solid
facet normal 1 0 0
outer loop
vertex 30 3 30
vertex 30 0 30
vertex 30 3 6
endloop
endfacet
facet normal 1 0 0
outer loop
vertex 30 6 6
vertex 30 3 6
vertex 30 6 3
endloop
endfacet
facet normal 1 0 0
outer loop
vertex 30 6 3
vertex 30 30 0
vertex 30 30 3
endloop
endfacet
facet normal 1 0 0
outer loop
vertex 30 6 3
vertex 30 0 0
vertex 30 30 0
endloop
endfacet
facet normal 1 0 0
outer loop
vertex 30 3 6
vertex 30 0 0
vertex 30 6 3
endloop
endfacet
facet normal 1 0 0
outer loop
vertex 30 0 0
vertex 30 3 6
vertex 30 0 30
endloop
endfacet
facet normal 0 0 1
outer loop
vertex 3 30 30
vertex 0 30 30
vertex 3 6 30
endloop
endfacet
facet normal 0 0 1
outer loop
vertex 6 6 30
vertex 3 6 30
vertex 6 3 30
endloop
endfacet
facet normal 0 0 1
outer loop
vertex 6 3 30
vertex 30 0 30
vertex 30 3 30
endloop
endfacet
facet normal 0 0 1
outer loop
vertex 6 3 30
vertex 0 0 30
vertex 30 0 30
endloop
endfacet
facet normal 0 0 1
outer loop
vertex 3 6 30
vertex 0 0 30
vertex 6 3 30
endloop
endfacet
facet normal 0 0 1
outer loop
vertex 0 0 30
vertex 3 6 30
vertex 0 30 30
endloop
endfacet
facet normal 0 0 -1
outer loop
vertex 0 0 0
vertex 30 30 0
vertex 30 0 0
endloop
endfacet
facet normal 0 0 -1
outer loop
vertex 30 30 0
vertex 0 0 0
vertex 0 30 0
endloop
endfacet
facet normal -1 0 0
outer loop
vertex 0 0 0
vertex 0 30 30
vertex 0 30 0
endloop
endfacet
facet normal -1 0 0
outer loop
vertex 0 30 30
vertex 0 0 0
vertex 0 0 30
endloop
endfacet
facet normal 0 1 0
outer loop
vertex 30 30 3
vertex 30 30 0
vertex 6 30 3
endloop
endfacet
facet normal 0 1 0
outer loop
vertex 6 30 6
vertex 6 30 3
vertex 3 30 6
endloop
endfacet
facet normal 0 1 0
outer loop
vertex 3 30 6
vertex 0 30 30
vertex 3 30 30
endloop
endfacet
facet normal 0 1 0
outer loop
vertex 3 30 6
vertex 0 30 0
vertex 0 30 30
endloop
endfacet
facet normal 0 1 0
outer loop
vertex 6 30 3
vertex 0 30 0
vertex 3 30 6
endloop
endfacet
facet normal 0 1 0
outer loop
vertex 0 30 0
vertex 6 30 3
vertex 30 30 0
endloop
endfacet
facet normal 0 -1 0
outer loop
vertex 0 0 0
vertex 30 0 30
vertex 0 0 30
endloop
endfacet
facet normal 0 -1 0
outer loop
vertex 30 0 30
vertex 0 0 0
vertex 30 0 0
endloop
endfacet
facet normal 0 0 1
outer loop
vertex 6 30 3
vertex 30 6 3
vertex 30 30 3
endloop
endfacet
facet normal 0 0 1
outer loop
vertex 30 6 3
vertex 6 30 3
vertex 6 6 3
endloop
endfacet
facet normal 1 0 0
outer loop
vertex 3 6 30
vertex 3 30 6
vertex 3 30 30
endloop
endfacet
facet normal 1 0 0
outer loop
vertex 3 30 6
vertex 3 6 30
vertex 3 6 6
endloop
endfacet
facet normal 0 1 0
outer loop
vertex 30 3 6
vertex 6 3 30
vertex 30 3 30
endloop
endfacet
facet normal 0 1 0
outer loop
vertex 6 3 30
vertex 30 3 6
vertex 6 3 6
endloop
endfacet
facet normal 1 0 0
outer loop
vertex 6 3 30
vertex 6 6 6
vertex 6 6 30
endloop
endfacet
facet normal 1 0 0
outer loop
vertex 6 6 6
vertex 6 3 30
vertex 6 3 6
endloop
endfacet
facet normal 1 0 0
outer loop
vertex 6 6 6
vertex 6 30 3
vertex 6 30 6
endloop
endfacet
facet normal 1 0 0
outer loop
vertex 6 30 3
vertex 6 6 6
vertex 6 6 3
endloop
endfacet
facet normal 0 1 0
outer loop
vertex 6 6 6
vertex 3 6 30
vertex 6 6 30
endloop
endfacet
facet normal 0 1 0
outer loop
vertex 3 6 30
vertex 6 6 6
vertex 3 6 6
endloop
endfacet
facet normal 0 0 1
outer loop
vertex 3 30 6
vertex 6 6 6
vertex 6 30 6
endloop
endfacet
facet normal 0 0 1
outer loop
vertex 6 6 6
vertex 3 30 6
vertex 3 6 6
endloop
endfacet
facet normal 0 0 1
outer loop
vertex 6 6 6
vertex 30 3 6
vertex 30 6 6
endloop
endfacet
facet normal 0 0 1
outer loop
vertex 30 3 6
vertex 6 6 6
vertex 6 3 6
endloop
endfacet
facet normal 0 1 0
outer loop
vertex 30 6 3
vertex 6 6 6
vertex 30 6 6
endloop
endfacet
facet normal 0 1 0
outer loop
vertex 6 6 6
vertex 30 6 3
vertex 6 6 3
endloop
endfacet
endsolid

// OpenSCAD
difference(){
    cube ([30,30,30]);
    translate ([3,3,3]) cube ([30,30,30]);
}
cube ([6,6,30]);
cube ([6,30,6]);
cube ([30,6,6]);
